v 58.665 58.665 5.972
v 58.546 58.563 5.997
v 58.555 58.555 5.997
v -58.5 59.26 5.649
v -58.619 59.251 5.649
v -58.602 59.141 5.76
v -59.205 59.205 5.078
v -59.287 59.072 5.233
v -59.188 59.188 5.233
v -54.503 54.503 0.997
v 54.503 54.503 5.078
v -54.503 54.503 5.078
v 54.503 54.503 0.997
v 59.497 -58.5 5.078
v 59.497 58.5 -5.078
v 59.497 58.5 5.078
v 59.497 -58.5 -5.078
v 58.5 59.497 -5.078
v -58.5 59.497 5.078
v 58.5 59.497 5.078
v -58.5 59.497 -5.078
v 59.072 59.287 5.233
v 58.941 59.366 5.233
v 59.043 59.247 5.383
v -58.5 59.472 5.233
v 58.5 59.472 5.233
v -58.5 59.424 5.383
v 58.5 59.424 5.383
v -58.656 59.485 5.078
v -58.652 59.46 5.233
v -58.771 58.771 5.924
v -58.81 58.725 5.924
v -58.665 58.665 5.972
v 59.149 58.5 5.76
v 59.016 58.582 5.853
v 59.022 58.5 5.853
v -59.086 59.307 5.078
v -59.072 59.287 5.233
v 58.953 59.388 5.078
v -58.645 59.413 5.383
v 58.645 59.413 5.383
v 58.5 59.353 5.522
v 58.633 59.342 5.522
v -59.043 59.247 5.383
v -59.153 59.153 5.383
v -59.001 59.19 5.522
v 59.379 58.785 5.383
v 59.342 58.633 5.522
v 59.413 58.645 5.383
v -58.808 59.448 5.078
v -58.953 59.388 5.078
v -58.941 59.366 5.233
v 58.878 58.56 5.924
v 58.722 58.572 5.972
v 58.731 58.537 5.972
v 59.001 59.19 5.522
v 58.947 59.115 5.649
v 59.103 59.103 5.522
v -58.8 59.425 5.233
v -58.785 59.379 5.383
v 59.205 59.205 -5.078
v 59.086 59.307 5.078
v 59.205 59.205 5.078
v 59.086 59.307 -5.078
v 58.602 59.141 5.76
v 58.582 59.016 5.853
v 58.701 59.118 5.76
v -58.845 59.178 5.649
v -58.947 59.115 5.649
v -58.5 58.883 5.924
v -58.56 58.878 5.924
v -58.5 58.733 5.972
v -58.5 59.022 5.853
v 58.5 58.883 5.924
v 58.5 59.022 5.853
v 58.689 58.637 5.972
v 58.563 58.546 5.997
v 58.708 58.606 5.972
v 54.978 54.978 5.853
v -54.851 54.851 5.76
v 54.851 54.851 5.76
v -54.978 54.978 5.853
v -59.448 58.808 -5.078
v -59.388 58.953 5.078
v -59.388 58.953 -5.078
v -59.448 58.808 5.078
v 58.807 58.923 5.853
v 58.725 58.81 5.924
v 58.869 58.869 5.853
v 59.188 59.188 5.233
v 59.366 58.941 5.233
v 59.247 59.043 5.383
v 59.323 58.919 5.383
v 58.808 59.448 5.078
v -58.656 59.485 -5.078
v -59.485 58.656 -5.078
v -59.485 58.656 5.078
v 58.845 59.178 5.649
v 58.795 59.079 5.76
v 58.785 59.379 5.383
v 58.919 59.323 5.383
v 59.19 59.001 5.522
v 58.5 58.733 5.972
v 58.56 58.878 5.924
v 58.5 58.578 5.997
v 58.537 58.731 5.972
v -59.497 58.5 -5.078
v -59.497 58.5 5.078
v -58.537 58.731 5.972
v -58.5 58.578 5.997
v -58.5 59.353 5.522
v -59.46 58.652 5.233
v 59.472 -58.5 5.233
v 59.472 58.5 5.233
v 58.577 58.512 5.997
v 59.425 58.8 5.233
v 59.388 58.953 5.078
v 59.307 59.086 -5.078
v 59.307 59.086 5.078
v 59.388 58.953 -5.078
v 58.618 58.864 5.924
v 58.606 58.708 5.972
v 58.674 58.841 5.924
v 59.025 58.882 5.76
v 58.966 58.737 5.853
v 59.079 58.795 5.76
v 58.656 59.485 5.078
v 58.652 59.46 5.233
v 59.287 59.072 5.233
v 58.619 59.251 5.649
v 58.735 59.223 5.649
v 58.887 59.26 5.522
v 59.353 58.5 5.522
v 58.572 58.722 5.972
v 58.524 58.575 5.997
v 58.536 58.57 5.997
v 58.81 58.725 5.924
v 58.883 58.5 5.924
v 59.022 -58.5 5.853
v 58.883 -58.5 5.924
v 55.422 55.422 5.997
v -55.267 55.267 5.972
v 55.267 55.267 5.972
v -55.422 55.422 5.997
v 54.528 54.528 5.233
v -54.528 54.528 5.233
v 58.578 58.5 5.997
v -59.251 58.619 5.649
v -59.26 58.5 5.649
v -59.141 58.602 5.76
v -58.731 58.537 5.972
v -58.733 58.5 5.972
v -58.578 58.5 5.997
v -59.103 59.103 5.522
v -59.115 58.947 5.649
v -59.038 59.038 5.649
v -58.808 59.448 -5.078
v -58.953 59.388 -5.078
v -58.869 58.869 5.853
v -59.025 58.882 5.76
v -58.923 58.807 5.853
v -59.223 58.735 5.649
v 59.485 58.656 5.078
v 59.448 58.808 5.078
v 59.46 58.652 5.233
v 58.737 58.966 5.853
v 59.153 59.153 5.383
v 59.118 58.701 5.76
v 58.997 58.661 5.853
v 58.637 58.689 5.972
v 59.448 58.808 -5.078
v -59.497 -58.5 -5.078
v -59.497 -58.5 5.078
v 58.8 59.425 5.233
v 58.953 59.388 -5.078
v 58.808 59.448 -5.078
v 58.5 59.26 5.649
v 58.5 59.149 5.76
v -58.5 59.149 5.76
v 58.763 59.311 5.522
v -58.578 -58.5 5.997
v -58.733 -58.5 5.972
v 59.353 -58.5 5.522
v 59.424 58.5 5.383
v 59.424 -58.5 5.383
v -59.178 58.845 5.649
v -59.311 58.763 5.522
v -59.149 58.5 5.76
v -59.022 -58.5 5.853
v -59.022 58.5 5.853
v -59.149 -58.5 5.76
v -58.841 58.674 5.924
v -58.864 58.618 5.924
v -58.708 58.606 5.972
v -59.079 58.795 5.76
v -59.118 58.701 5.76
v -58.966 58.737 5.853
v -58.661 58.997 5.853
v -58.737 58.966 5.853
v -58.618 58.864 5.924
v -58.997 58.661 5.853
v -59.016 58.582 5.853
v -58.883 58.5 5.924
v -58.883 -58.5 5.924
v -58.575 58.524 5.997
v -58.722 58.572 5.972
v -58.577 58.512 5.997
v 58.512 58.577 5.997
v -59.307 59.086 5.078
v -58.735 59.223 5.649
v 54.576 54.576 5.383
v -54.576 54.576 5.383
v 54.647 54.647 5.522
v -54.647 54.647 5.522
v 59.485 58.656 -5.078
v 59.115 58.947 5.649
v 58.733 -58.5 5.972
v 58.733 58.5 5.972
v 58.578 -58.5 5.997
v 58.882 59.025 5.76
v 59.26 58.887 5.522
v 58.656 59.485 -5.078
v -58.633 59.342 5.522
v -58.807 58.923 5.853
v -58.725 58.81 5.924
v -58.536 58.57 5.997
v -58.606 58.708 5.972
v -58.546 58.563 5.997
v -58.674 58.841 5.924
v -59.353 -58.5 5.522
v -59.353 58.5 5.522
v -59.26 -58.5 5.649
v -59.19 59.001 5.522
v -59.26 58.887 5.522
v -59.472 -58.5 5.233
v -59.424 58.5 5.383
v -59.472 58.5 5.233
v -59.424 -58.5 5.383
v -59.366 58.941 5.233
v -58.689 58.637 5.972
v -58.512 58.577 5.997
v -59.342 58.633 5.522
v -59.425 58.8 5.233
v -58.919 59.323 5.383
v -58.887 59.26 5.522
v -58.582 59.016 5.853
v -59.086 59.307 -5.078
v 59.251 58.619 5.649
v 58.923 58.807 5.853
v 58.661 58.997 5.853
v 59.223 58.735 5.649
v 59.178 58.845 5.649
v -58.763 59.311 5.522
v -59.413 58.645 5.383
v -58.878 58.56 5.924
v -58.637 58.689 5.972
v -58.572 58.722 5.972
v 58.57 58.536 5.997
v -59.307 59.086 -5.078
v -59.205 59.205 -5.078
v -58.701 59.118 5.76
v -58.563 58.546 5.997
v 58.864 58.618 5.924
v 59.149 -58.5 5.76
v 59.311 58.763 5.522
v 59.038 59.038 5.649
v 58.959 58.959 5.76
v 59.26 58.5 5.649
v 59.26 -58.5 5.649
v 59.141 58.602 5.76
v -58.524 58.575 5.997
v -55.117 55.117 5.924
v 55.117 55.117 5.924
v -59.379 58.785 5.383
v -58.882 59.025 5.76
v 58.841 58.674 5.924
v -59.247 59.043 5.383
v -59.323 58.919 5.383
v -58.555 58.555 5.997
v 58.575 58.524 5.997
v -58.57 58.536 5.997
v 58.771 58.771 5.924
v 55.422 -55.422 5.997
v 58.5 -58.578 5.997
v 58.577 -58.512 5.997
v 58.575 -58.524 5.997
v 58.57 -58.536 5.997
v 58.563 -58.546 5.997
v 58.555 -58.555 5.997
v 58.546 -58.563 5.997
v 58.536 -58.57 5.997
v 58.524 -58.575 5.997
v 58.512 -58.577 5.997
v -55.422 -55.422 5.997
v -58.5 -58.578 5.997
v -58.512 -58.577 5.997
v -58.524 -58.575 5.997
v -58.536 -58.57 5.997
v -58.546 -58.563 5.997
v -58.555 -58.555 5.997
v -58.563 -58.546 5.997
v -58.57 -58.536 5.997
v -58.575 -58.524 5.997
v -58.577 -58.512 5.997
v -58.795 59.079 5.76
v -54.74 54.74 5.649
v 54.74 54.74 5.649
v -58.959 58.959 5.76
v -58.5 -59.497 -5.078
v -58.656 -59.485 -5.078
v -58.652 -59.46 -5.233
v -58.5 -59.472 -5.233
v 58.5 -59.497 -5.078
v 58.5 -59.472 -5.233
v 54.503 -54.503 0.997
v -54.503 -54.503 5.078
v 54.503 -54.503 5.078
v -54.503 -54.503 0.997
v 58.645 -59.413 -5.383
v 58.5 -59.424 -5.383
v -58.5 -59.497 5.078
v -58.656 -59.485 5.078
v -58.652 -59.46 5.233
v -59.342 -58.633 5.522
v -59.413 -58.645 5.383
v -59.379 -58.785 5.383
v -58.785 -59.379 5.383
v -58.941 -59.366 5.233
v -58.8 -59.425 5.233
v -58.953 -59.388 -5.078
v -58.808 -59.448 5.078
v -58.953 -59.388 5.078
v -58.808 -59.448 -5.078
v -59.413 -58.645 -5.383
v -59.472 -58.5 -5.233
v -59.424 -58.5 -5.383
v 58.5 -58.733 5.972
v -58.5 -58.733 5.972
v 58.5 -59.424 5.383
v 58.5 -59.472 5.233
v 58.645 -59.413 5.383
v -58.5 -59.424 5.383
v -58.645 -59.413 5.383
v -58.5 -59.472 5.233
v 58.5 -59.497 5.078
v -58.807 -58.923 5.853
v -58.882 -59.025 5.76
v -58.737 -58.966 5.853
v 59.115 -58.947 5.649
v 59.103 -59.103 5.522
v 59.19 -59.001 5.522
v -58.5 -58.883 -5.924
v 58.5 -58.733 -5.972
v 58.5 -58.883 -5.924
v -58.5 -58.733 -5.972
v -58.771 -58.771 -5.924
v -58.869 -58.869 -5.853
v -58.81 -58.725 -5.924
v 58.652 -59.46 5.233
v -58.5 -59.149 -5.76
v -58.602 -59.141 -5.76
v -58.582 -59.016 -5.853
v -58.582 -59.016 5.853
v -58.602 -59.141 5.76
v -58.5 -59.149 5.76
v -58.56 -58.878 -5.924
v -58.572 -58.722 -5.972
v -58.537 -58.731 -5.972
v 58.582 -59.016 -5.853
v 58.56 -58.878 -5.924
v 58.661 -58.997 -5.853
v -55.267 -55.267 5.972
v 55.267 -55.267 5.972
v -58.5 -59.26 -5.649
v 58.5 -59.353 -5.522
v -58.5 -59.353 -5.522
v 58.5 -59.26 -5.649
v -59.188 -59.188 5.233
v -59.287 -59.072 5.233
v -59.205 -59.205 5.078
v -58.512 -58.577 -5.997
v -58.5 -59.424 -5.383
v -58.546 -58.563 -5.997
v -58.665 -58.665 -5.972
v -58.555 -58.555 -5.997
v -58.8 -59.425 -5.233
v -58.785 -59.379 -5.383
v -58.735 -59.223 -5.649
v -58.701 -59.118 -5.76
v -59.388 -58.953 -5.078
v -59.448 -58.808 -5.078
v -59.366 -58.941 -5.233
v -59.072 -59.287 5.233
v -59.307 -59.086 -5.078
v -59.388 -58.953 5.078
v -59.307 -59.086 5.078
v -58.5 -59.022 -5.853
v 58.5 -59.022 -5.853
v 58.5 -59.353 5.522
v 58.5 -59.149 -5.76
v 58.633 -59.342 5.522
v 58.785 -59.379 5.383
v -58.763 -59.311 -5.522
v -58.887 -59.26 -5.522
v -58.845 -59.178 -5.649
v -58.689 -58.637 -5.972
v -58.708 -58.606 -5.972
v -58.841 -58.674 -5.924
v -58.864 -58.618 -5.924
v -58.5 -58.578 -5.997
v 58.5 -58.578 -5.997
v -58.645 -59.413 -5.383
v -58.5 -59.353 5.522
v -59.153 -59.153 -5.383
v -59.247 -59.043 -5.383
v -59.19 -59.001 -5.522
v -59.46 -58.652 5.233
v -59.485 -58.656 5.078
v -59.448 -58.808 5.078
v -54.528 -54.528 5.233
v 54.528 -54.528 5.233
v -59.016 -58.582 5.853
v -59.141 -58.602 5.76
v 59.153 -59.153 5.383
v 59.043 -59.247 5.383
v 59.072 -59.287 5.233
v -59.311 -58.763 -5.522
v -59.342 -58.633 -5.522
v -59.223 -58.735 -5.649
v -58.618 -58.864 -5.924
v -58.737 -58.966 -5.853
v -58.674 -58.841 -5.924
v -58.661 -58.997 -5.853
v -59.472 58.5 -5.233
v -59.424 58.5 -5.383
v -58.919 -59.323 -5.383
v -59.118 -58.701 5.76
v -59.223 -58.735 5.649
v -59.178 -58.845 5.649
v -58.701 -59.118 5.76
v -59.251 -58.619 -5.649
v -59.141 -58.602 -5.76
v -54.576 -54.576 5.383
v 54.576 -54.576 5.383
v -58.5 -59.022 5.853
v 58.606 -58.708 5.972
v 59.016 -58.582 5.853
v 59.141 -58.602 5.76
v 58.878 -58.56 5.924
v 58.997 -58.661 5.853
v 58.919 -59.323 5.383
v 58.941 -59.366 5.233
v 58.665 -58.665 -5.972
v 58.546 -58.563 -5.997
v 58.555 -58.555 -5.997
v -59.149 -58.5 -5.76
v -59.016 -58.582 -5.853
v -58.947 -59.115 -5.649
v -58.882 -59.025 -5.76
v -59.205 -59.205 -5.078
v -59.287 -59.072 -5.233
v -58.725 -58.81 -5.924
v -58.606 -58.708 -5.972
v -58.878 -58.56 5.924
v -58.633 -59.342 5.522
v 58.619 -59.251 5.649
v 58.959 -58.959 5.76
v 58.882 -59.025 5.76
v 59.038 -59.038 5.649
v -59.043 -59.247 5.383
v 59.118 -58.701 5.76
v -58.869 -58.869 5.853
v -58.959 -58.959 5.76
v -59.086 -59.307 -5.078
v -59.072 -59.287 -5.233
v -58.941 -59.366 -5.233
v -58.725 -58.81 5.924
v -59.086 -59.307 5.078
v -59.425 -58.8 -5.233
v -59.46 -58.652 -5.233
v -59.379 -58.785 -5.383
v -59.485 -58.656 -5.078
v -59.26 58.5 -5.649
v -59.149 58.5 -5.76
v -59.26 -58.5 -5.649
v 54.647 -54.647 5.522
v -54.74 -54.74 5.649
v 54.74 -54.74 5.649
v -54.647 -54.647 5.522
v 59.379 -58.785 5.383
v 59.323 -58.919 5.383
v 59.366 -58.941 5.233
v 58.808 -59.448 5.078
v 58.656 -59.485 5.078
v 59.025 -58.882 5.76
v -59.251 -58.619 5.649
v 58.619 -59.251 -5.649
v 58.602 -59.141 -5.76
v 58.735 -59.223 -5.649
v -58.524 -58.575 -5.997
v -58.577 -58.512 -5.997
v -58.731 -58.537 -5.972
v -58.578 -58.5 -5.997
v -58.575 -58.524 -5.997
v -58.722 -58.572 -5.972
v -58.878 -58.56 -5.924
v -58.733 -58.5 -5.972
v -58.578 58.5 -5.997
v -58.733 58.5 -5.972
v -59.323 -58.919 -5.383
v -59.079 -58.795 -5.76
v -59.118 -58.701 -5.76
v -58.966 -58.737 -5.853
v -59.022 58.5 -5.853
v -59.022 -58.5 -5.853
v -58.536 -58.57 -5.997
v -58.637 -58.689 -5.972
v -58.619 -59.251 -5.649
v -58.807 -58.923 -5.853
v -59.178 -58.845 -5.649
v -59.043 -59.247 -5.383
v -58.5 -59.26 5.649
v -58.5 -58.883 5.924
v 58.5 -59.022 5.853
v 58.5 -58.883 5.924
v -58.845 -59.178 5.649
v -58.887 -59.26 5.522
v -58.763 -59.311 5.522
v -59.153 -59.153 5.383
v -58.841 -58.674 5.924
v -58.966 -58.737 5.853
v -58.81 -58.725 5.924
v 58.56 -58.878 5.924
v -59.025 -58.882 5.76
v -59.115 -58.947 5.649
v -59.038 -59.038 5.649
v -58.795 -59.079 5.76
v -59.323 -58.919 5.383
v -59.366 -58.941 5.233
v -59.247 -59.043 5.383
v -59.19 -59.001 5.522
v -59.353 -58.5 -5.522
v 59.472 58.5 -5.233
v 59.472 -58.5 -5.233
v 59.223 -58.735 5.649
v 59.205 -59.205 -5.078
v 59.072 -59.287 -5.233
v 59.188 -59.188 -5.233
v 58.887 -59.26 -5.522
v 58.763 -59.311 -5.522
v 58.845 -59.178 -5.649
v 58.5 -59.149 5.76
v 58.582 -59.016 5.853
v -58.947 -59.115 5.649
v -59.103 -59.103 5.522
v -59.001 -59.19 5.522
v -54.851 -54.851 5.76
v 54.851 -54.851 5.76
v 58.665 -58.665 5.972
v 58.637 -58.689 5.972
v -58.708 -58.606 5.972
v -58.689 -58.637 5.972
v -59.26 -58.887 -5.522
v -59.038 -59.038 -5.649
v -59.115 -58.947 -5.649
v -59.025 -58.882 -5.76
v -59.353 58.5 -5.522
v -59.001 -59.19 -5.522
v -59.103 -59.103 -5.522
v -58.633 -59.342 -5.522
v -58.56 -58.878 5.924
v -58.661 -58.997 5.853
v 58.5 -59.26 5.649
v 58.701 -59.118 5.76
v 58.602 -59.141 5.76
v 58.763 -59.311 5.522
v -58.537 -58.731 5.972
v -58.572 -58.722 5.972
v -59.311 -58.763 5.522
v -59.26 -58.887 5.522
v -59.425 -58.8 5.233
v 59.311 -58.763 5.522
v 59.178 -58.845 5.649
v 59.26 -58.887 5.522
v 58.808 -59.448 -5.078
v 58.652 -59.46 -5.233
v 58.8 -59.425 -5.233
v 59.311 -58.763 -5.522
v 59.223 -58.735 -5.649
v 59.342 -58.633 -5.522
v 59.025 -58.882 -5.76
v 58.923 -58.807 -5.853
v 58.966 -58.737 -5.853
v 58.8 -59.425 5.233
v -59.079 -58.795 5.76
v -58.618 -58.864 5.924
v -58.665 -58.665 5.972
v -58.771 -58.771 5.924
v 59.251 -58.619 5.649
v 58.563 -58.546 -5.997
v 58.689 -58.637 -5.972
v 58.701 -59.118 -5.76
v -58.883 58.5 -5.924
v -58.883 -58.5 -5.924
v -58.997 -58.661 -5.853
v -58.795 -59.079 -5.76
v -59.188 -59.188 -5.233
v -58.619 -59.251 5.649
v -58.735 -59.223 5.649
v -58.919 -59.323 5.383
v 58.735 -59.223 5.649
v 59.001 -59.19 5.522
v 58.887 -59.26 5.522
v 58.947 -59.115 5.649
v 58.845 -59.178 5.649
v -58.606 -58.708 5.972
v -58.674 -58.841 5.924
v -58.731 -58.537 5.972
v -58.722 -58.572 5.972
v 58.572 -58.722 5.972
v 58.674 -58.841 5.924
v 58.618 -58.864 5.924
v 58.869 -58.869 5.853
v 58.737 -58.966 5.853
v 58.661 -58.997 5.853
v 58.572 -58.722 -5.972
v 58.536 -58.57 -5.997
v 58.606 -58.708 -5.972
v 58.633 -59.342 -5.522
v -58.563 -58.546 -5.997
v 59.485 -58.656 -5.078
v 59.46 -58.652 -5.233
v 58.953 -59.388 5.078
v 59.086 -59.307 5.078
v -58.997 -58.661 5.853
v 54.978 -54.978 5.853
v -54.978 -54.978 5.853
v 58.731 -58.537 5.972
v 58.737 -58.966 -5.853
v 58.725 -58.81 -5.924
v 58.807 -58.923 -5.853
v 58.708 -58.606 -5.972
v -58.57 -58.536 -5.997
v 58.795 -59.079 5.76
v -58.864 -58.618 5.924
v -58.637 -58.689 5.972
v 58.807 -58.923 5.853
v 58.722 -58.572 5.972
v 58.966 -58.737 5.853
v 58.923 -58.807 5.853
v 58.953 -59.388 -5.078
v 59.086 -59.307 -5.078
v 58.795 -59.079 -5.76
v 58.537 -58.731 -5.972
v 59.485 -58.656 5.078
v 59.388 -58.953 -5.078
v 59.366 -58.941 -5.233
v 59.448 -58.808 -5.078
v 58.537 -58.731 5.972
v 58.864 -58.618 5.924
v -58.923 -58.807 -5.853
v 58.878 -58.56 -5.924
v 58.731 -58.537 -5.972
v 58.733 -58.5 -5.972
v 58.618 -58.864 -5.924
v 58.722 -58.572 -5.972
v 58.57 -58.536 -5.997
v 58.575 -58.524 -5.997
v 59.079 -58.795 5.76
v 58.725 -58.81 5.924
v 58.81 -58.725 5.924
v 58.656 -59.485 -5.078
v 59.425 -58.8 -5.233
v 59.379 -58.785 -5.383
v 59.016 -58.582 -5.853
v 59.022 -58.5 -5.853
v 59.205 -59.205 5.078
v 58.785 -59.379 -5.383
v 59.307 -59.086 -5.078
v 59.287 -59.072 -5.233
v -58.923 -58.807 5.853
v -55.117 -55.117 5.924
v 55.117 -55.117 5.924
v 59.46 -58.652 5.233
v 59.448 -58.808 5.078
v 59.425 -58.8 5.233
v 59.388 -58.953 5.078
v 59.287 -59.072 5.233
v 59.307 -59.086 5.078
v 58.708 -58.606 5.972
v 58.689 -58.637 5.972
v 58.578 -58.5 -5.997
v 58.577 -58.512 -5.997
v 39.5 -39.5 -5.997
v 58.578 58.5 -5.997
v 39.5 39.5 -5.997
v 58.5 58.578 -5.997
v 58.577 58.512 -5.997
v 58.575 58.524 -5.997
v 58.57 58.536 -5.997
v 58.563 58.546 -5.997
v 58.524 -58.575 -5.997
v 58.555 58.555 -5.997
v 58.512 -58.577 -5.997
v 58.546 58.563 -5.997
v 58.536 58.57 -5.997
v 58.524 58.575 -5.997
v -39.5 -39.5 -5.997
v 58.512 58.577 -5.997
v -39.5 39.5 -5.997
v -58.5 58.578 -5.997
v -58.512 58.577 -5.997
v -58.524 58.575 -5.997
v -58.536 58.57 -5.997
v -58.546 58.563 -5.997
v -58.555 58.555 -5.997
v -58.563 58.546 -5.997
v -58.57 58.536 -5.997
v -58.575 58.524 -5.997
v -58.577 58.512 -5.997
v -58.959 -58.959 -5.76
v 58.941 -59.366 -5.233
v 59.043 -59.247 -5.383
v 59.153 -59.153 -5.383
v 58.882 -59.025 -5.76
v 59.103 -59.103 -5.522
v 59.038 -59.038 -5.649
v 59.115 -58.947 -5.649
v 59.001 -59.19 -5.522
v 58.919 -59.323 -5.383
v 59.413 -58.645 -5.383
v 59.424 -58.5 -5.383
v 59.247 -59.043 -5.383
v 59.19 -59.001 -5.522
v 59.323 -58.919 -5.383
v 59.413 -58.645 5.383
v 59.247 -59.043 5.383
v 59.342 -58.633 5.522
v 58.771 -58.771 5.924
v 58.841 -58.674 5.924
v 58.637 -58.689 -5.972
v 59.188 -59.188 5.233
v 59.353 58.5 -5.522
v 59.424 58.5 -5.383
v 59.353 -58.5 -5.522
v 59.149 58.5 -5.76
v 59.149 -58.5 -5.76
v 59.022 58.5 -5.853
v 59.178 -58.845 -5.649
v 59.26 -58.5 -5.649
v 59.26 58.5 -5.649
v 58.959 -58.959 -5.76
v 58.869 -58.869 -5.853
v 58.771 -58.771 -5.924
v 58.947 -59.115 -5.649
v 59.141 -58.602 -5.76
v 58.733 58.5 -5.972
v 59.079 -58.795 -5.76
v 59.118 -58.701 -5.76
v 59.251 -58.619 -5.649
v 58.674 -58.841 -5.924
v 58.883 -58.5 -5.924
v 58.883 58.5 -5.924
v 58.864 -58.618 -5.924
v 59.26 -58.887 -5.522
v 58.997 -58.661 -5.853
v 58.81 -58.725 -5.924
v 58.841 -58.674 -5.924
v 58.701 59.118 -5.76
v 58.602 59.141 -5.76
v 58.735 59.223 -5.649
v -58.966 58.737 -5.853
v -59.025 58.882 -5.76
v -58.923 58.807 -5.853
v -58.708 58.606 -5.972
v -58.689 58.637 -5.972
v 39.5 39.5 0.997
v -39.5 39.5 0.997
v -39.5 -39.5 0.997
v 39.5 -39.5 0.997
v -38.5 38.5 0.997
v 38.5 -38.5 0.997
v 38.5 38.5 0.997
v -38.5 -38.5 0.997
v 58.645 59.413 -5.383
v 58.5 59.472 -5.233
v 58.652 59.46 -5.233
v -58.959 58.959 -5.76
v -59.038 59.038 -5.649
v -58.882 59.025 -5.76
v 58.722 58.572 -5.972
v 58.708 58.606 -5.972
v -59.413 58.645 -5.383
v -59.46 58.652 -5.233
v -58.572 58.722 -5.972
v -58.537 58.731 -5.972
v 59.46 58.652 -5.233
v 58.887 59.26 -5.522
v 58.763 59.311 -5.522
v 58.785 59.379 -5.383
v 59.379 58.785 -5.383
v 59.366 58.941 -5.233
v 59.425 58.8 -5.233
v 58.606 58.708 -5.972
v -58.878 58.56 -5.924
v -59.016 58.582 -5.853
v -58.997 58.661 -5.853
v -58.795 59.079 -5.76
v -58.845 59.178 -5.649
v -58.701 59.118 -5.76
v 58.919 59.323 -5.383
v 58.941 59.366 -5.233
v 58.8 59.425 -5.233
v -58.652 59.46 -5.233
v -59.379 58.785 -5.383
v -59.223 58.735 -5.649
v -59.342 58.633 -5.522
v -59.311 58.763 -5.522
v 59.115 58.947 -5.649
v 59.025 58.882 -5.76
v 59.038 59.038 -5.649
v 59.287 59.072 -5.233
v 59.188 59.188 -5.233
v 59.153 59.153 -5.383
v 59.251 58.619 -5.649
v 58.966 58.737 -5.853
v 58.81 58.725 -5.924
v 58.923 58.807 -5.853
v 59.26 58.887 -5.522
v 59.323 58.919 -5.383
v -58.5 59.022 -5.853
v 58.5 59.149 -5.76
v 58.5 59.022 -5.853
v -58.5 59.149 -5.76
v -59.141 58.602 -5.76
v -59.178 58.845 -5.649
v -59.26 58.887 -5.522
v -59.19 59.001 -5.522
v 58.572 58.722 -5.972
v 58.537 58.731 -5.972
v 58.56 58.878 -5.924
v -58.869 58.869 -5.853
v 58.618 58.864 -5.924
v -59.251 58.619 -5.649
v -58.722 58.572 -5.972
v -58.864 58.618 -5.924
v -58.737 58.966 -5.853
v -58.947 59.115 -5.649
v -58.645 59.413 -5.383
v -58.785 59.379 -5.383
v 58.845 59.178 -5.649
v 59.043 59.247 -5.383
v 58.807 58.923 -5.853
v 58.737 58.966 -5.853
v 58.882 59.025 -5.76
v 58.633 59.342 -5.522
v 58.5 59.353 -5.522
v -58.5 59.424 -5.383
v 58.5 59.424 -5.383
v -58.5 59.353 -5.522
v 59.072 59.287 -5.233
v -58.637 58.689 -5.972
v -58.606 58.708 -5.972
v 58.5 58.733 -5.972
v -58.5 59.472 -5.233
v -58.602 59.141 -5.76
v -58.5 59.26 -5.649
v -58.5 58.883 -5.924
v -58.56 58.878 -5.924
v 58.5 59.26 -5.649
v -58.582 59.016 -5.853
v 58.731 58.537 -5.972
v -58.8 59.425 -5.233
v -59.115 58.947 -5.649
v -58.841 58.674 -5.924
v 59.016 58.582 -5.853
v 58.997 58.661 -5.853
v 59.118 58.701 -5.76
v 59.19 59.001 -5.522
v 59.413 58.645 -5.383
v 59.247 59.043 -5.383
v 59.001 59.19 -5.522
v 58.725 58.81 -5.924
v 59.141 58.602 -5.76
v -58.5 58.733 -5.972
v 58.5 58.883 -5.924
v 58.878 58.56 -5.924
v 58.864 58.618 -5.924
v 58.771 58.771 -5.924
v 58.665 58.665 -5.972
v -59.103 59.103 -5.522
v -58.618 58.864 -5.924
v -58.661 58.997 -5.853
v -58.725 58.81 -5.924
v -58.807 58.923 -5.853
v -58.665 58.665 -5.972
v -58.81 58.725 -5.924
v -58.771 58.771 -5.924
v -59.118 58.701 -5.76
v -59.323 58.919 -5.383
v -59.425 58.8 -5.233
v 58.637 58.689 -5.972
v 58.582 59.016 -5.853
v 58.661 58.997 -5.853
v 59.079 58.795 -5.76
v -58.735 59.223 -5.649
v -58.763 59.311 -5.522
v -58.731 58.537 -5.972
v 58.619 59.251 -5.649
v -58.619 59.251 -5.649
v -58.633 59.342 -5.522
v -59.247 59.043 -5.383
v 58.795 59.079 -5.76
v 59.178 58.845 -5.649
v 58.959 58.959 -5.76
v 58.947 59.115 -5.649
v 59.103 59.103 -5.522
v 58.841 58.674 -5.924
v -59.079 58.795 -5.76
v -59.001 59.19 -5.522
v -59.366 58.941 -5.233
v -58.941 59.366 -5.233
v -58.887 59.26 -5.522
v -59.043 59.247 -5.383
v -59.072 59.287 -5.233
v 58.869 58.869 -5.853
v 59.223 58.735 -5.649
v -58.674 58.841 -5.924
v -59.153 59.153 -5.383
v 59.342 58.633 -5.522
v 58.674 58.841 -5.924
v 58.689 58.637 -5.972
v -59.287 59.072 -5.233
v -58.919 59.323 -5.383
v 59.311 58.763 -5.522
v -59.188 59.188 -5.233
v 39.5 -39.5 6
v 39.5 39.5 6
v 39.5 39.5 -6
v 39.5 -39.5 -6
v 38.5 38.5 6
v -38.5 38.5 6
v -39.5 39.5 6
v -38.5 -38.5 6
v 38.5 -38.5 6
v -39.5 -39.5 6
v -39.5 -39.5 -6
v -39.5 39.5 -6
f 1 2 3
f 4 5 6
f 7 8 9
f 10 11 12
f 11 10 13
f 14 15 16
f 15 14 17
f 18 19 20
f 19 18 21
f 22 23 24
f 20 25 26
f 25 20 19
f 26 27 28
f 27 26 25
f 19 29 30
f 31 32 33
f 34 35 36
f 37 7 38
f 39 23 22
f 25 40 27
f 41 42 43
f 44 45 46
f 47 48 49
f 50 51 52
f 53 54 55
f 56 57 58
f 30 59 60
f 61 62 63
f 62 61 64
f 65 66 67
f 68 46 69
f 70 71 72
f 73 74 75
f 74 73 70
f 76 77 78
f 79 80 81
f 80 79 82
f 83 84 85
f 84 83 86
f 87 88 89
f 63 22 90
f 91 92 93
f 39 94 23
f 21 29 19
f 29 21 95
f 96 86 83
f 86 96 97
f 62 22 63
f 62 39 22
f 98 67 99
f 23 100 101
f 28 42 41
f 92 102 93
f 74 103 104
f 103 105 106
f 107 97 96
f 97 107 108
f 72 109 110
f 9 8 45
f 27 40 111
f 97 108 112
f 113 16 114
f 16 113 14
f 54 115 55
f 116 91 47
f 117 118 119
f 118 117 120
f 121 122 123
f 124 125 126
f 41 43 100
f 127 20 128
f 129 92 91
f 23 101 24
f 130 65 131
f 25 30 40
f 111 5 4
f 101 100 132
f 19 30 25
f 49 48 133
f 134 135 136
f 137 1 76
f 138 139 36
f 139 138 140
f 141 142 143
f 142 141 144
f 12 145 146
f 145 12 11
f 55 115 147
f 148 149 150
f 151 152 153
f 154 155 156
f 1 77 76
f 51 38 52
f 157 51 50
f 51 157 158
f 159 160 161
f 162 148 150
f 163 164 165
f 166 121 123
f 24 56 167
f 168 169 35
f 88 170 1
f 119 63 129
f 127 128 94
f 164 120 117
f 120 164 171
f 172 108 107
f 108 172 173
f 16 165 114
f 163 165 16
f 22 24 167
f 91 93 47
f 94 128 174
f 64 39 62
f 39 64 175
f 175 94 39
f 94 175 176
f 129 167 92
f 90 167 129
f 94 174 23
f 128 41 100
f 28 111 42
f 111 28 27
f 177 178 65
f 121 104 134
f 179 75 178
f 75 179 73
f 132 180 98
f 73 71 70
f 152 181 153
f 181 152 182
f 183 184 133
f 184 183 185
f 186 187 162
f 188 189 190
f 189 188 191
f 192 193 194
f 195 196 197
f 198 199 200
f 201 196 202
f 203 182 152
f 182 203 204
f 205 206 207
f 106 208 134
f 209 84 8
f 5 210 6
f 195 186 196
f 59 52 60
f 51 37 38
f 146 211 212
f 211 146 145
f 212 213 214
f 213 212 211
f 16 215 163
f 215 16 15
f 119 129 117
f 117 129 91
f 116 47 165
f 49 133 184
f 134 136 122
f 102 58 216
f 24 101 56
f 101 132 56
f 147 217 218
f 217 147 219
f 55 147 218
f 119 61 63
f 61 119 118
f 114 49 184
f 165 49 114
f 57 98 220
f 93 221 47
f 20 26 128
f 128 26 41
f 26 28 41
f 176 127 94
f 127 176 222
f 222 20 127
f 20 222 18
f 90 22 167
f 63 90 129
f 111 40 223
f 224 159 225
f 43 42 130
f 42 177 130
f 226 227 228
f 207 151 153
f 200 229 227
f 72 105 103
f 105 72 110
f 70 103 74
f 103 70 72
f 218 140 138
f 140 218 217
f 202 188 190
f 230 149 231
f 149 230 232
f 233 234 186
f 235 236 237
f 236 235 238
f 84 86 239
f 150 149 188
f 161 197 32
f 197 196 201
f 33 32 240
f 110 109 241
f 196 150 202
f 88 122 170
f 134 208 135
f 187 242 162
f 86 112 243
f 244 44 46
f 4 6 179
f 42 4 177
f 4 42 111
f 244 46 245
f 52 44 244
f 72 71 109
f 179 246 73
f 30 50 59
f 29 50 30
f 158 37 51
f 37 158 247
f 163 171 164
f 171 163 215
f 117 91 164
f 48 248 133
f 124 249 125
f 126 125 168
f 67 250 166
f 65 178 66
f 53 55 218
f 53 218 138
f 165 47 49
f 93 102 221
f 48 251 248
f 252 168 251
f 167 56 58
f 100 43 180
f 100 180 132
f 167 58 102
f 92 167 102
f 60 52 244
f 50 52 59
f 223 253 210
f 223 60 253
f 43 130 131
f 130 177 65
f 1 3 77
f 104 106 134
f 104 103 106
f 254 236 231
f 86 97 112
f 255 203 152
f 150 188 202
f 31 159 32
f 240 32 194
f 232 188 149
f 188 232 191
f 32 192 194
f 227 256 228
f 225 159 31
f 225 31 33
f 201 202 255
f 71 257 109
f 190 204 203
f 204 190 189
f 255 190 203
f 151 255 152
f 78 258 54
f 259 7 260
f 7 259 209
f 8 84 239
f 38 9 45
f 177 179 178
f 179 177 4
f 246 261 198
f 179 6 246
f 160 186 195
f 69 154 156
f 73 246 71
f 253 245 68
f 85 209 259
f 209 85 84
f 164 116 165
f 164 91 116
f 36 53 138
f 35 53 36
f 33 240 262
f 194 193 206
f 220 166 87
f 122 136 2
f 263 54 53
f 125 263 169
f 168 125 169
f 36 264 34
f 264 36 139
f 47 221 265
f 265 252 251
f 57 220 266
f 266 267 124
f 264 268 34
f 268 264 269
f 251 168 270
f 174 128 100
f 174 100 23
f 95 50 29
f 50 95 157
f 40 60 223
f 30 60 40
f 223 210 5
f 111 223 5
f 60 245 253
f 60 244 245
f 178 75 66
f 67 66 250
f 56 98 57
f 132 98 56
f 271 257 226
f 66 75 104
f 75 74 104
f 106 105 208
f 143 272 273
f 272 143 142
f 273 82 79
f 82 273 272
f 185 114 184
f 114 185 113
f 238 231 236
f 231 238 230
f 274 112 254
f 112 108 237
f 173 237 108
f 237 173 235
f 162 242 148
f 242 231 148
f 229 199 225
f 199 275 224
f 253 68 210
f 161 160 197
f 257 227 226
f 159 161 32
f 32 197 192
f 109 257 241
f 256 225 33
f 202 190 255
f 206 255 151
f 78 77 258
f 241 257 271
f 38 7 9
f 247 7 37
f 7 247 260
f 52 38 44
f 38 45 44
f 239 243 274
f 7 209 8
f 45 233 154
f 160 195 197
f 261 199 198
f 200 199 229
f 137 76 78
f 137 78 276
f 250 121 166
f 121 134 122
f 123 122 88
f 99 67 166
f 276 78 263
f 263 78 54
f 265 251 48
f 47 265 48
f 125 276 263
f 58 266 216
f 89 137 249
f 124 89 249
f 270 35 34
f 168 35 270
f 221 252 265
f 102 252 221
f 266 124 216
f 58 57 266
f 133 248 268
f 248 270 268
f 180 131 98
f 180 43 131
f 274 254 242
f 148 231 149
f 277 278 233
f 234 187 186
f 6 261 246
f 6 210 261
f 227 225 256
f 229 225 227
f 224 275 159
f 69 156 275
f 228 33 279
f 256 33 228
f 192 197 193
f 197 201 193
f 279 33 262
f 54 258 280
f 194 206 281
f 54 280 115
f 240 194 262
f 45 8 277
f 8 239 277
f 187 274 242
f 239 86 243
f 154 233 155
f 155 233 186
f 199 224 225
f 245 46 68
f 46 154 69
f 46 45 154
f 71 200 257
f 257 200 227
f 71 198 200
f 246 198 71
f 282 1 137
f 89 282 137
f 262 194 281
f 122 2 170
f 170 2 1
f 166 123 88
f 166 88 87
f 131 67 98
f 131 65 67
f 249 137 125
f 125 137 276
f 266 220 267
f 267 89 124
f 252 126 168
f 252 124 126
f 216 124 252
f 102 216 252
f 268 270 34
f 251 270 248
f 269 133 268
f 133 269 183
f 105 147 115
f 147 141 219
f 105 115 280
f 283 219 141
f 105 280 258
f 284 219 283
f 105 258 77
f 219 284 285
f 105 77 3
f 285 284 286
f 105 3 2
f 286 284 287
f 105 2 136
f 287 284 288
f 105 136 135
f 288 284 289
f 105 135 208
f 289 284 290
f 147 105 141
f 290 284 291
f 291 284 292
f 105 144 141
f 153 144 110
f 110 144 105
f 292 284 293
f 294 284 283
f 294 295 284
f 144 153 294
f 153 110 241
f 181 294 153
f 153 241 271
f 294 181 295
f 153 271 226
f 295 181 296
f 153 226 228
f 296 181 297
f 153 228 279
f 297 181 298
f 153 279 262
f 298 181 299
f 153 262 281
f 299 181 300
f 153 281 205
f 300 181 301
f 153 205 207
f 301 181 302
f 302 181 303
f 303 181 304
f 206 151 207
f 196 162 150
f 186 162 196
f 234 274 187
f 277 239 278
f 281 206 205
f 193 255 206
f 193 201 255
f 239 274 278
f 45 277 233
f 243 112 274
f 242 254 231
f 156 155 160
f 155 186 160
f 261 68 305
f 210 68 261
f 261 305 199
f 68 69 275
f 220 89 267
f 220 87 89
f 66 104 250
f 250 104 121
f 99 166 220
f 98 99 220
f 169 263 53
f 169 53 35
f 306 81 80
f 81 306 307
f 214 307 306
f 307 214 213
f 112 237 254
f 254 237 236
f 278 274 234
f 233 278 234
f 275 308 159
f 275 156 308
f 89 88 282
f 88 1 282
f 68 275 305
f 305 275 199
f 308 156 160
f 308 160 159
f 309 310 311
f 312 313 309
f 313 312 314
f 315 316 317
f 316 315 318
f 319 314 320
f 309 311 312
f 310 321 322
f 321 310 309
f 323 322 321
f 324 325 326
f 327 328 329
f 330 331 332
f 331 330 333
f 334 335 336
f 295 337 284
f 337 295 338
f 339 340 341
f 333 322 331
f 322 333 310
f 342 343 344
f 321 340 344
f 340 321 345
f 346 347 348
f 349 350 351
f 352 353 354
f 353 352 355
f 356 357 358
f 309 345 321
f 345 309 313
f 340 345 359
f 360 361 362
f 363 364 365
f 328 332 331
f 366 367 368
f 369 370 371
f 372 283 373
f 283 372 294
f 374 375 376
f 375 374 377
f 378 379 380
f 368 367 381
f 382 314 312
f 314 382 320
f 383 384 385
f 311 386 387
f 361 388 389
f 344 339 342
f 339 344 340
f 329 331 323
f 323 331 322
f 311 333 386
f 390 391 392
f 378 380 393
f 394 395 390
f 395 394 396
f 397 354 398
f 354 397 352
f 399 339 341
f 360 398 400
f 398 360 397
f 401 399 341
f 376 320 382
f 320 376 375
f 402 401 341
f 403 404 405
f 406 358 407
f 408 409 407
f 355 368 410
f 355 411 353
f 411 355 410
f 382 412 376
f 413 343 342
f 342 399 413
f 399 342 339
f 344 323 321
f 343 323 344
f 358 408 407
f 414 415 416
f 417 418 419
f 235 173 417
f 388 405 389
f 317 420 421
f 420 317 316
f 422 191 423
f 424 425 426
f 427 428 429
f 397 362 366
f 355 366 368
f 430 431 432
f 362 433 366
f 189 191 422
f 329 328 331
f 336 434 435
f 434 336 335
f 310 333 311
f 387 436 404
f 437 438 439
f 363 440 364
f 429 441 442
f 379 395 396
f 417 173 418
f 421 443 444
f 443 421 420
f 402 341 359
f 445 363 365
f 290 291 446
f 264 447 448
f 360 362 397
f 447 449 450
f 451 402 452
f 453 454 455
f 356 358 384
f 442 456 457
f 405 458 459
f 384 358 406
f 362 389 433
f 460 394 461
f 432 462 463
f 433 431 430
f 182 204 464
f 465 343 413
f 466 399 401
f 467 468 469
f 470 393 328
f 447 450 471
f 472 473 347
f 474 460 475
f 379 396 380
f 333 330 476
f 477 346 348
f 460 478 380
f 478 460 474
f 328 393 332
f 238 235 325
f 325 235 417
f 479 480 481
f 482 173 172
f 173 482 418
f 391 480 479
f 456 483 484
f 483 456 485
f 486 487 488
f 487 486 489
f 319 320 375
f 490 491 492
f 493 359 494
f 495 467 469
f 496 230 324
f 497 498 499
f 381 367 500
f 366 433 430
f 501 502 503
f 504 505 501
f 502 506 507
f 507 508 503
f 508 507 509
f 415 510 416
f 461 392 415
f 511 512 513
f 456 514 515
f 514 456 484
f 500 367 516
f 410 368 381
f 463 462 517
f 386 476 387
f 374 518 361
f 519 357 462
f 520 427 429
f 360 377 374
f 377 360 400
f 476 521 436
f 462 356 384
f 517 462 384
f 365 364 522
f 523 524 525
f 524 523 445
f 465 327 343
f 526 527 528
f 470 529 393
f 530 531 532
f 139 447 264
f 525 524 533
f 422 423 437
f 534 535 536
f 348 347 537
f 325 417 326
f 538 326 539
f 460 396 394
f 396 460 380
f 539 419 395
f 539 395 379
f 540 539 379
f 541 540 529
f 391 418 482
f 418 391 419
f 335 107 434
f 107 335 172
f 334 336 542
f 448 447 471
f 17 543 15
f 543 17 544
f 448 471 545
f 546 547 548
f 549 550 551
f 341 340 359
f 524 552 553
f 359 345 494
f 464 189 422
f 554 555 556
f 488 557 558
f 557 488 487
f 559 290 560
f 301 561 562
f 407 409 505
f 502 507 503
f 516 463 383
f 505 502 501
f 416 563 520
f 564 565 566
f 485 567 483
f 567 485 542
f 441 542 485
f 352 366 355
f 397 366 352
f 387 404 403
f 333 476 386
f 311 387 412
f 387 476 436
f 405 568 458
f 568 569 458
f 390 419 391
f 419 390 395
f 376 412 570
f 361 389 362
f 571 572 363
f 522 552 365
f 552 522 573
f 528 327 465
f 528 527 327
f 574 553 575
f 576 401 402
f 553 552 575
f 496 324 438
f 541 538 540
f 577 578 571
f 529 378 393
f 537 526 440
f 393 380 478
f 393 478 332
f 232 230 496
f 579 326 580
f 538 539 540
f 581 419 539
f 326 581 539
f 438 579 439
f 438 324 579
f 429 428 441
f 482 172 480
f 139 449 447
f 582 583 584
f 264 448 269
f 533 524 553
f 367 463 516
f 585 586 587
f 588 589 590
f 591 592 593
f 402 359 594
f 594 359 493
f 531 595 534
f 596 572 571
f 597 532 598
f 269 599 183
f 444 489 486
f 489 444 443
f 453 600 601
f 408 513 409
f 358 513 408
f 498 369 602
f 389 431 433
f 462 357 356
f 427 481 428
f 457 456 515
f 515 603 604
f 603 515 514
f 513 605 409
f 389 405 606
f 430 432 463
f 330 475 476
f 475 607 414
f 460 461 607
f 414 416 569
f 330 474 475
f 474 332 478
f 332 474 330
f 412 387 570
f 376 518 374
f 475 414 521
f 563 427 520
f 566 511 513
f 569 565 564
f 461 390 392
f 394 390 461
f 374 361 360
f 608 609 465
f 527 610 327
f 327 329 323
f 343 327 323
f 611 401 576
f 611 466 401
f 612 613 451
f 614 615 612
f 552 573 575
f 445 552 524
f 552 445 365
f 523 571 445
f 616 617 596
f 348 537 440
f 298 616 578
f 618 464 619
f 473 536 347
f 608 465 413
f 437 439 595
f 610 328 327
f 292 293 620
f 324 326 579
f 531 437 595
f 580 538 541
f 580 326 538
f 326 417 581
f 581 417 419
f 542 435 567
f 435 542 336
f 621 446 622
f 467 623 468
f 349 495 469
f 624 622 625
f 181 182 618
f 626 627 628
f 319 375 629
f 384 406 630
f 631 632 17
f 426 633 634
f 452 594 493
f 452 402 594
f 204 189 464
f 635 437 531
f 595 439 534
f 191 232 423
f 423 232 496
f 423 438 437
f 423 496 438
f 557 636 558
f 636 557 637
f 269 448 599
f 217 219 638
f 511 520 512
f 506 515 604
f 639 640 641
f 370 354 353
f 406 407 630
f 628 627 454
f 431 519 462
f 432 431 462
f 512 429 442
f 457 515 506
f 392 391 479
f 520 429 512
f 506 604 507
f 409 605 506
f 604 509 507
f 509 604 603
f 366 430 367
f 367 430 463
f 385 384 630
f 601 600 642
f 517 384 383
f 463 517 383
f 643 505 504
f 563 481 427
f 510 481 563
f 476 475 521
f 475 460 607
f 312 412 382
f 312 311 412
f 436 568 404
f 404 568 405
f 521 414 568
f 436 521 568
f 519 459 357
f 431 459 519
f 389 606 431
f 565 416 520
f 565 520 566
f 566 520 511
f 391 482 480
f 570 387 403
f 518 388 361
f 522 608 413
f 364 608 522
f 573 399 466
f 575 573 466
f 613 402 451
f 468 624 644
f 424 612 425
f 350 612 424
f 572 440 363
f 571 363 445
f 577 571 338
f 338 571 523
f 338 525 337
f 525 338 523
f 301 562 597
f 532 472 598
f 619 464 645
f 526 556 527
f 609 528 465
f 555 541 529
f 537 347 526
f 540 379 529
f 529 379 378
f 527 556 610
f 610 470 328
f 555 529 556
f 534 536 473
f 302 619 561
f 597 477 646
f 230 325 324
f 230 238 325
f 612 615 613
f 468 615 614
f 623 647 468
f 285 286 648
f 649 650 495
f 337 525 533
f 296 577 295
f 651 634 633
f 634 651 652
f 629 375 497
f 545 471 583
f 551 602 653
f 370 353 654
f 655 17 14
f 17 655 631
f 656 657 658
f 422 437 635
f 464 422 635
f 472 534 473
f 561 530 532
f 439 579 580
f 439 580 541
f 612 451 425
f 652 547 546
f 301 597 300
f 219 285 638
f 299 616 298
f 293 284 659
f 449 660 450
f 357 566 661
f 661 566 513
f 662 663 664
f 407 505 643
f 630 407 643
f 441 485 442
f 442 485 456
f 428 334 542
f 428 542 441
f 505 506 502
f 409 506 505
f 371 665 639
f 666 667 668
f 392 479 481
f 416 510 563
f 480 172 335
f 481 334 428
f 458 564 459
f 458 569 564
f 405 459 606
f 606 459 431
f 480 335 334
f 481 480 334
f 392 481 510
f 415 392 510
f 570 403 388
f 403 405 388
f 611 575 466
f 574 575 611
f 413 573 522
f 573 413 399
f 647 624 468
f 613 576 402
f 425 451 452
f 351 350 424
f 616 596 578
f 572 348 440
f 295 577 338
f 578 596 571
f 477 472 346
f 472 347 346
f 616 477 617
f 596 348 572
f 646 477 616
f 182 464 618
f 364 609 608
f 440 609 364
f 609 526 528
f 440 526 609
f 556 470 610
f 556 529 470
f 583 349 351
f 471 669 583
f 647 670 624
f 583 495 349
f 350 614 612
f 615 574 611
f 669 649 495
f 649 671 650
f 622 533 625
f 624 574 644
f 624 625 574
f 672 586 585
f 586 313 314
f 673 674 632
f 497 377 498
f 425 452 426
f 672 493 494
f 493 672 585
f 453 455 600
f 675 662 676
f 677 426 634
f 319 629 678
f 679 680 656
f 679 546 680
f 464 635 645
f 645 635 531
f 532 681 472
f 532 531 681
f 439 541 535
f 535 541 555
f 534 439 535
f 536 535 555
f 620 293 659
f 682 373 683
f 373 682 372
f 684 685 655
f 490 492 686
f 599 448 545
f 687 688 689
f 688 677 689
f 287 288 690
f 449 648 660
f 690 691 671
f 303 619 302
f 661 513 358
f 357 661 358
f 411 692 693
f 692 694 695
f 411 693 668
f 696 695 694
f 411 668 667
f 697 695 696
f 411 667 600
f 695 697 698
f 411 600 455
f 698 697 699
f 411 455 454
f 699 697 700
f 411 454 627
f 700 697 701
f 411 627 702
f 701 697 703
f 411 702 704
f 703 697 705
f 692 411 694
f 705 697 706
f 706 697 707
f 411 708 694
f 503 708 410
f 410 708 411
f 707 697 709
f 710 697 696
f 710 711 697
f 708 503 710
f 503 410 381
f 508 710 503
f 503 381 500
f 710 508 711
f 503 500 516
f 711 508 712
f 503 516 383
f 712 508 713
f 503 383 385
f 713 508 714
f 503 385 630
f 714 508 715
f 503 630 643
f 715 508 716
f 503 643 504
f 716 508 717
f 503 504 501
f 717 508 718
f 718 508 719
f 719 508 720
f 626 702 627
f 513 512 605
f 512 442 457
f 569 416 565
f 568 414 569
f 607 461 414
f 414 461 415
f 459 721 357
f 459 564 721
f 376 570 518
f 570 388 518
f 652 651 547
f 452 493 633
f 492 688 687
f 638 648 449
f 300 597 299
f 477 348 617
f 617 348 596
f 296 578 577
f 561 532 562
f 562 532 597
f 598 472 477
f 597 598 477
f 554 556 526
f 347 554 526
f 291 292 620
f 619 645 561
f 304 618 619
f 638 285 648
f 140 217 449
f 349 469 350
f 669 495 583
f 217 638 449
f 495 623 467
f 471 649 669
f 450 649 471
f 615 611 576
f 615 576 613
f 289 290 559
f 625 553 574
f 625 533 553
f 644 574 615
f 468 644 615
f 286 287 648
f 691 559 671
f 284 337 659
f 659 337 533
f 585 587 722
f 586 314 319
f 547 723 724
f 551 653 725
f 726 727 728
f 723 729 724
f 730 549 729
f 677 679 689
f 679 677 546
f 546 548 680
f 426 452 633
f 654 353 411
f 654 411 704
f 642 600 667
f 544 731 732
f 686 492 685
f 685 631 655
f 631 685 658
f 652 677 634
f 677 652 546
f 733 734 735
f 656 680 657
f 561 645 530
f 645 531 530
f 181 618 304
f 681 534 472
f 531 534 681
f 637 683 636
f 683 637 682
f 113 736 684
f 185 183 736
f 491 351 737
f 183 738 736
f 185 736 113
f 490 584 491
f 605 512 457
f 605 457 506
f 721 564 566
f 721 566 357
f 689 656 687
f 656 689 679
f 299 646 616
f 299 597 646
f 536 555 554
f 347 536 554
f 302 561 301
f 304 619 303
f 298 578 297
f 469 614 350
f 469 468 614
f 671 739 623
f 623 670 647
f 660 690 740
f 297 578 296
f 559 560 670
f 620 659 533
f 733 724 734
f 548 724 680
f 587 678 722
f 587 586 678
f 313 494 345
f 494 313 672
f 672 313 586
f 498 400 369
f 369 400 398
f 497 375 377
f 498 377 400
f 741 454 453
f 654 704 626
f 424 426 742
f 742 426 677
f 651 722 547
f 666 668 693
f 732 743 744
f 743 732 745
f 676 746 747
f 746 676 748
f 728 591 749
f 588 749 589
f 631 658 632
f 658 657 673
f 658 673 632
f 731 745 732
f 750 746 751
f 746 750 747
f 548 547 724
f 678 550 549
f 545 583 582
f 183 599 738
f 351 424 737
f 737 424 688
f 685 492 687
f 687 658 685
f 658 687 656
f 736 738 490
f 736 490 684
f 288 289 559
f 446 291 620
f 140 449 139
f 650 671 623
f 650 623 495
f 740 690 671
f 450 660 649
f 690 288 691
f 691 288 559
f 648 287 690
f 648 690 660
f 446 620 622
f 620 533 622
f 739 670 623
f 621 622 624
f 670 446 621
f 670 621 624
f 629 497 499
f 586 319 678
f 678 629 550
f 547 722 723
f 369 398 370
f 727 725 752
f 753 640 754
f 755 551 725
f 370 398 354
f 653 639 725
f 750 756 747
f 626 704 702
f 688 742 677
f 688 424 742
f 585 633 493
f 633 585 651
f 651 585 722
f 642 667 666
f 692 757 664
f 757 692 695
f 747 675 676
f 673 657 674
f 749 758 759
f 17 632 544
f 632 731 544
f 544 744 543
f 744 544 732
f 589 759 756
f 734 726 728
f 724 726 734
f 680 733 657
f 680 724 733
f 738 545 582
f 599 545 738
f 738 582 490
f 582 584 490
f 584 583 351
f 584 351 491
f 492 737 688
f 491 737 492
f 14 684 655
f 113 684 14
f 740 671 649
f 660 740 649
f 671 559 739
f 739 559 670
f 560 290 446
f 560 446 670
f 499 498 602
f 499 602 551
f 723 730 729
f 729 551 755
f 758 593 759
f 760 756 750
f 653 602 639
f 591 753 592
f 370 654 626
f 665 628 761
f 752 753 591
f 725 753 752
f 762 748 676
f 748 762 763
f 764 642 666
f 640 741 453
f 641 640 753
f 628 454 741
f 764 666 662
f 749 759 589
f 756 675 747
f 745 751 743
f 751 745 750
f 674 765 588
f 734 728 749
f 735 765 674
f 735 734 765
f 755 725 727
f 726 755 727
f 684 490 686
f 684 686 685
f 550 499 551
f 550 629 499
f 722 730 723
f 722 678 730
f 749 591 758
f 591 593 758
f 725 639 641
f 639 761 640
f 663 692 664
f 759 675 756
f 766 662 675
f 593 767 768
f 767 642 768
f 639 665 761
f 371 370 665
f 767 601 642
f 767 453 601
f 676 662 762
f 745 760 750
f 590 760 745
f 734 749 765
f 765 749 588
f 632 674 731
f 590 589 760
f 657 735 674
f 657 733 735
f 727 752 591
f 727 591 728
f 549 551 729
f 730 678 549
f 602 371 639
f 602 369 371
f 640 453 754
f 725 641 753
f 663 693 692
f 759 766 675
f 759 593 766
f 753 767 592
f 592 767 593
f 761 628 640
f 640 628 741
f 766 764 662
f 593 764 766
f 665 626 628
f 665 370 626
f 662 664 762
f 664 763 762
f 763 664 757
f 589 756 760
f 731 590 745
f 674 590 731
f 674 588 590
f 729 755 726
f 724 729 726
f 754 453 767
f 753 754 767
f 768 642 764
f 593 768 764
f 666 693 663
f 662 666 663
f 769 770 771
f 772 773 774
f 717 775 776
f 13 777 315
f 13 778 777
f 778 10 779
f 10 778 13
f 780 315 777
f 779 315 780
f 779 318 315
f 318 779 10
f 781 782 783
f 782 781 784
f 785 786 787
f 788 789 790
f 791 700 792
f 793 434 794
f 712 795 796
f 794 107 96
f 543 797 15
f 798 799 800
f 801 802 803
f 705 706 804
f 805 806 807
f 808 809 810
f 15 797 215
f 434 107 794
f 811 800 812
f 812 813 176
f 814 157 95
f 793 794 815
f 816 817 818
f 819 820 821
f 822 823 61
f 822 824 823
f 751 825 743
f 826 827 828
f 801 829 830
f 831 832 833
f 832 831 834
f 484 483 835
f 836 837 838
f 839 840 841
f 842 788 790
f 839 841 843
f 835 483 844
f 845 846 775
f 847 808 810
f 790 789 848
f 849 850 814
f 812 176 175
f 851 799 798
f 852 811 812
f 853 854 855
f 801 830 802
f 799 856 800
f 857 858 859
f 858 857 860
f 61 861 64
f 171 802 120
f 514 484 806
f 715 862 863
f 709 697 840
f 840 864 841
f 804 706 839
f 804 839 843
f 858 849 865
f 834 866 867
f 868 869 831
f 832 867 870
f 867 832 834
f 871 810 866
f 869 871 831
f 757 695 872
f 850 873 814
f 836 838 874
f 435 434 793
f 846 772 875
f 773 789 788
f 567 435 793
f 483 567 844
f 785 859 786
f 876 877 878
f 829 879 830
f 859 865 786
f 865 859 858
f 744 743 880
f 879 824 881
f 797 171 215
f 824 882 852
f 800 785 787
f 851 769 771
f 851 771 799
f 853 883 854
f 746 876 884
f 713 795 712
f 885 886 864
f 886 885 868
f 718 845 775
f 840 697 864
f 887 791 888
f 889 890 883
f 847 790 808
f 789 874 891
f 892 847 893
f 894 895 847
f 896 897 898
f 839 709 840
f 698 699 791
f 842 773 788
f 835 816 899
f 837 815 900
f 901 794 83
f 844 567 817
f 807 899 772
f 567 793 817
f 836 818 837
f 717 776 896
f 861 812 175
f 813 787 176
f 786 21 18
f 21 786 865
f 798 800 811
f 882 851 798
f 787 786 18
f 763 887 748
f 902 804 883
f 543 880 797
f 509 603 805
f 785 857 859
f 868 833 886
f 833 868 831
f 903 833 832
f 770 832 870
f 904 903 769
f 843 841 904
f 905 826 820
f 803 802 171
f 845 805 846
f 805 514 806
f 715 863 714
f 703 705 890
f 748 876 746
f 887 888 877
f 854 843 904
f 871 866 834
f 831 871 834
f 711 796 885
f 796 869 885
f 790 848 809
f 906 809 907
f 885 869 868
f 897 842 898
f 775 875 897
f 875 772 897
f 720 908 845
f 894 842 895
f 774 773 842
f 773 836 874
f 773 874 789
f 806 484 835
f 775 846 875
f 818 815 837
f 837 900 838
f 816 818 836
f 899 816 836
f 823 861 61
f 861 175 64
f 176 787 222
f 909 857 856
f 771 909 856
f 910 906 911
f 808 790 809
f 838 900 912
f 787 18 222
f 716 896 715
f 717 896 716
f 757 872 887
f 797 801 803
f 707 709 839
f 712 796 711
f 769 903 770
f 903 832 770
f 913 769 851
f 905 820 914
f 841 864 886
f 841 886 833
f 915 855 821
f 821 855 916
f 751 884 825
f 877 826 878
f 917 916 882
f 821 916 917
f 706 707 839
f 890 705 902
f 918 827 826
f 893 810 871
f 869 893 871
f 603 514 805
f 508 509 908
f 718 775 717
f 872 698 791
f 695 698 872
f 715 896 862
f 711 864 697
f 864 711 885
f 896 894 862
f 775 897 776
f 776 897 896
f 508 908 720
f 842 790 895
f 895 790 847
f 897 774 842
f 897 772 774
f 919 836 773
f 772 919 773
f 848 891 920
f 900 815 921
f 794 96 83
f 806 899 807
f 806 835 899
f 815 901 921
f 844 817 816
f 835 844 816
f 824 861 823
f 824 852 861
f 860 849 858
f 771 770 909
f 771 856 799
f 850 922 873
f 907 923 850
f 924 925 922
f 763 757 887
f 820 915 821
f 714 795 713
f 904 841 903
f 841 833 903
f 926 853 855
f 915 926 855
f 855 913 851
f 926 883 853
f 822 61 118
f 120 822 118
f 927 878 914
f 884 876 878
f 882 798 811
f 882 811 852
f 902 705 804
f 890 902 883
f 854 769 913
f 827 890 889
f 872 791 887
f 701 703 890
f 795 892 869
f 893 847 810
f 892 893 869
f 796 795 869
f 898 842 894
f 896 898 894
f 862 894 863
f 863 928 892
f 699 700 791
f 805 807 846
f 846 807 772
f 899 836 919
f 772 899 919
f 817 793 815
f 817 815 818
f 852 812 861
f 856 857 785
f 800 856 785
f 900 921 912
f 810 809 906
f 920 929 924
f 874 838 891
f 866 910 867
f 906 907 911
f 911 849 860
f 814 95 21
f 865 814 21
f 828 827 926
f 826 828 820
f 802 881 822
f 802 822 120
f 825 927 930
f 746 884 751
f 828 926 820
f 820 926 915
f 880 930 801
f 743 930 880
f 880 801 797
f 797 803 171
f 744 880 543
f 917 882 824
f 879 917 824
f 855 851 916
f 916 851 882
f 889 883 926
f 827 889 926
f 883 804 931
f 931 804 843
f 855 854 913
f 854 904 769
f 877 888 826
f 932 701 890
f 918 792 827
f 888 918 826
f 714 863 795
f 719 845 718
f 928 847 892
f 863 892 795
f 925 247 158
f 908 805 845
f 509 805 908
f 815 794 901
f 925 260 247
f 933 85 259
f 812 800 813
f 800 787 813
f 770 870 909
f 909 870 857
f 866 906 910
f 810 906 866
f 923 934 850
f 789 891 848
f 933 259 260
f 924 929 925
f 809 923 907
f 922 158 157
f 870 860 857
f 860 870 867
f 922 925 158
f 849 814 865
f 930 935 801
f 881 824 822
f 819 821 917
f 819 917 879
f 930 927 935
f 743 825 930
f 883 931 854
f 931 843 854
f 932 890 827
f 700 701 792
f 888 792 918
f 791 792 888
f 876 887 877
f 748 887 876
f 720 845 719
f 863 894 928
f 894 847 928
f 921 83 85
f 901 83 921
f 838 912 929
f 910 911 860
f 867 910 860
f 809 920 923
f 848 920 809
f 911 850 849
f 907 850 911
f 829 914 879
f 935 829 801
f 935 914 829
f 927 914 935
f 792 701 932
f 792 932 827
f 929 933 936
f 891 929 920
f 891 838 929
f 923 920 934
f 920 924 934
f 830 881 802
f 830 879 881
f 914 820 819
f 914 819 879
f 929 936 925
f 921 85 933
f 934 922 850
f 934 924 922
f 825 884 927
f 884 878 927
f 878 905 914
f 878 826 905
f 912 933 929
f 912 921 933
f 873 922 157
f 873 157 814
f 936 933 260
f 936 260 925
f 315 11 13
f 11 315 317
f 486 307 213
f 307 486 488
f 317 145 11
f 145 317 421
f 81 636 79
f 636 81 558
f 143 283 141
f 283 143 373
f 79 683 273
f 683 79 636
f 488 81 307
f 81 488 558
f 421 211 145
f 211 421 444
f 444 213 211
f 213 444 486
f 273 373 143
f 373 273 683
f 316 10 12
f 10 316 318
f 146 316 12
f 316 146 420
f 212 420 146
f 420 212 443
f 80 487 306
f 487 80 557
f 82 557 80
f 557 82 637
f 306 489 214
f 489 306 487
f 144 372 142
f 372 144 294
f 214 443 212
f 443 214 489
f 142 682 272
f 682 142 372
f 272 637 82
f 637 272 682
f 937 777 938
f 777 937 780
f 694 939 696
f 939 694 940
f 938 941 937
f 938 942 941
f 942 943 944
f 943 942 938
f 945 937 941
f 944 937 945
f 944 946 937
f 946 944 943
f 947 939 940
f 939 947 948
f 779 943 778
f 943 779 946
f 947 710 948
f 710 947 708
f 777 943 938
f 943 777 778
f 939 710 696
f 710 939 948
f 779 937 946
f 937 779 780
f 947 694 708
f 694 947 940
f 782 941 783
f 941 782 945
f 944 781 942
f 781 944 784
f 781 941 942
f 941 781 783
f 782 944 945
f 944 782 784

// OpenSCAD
$fn = 40;
esp_width = 23;
esp_height = 7.5;
esp_depth = 51.5;

module coaster_bottom(width, depth, height) {
  color("white") minkowski() {
    sphere(1);
    difference() {
      cube([width, depth, 10], center = true);

      translate([0, 0, 5]) {
        color("red") cube([width - 6, depth - 6, 10], center = true);
      }
    }
  }
}

module sensor_holder(width, depth, height) {
  color("red") difference() {
    cube([width + 2, depth + 2, height], center = true);
    translate([0,0,5]) {
      cube([width, depth, height], center = true);
    }
  }
}

coaster_bottom(117,117,10);
sensor_holder(77, 77, 12);
